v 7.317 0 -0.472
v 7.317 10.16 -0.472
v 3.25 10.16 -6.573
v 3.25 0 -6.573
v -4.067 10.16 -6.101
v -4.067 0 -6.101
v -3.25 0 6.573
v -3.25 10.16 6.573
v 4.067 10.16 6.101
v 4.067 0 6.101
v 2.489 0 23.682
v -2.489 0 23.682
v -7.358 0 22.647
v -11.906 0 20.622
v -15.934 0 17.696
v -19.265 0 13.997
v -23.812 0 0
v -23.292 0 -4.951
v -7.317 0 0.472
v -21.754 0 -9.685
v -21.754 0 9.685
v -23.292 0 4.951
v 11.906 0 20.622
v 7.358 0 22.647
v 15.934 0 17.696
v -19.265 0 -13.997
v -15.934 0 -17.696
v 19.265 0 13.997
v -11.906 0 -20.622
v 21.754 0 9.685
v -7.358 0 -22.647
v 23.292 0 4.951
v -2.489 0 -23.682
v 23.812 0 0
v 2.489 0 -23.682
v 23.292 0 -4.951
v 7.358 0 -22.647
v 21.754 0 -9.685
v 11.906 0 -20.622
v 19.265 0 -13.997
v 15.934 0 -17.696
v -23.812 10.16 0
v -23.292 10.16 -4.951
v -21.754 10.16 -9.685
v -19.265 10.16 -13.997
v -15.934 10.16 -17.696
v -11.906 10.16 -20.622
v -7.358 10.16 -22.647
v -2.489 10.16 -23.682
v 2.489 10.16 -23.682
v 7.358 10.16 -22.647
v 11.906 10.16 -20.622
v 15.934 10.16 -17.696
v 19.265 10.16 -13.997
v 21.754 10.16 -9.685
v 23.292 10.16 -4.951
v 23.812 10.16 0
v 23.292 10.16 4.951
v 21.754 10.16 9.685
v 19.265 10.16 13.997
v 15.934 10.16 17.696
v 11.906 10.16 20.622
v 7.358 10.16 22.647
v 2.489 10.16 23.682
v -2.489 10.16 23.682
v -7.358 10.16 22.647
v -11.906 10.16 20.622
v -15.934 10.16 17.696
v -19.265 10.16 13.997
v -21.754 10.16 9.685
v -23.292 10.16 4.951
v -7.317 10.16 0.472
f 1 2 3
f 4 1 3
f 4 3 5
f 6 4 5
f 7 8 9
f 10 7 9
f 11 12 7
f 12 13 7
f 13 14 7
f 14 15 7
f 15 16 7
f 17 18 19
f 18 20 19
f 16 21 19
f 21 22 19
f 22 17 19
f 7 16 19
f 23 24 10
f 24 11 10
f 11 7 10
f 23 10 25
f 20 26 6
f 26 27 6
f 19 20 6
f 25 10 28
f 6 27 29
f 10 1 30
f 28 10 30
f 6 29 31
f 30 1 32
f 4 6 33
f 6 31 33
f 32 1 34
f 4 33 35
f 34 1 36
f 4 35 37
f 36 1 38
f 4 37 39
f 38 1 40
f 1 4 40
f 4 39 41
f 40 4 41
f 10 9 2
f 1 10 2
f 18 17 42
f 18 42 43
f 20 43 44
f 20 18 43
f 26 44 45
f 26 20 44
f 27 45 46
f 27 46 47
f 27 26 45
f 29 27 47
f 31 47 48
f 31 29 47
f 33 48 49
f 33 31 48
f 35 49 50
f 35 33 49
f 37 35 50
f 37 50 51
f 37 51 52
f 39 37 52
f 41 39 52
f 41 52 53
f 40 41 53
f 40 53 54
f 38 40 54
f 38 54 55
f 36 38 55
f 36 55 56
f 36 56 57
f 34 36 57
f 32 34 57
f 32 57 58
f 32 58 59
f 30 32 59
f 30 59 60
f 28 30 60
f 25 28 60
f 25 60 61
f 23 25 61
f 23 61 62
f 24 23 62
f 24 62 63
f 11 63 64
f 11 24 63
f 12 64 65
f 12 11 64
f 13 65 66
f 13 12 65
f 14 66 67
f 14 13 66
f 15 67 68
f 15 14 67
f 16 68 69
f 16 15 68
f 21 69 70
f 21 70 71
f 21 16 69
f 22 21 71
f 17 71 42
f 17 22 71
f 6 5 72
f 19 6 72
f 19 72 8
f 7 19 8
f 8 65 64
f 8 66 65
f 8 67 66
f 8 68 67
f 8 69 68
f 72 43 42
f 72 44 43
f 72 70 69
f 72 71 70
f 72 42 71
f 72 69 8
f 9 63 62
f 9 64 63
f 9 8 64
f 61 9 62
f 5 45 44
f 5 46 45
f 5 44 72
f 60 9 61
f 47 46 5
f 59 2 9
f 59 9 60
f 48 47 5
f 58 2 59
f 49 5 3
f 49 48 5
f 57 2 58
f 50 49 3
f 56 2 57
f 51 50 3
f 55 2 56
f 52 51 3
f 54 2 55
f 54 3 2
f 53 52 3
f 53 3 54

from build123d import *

# Parameters (mm, degrees)
SKETCH1_R           = 30.1625
BOSS_EXTRUDE1_DEPTH = 10.16
CUT_EXTRUDE1_DEPTH  = 11.16
SKETCH3_R           = 30.1625
SKETCH3_R_2         = 23.8125
CUT_EXTRUDE2_DEPTH  = 11.16


with BuildPart() as part:
    # Sketch1 → Boss-Extrude1 (new body)
    with BuildSketch(Plane(origin=(0, 0, 0), x_dir=(1, 0, 0), z_dir=(0, 1, 0))):
        Circle(SKETCH1_R)
    extrude(amount=BOSS_EXTRUDE1_DEPTH)

    # Sketch2 → Cut-Extrude1 (cut, through all)
    with BuildSketch(Plane(origin=(0, 10.16, 0), x_dir=(1, 0, 0), z_dir=(0, 1, 0))):
        Polygon((4.067255107, -6.10088266), (7.317146922, 0.471904916), (3.249891816, 6.572787576), (-4.067255107, 6.10088266), (-7.317146922, -0.471904916), (-3.249891816, -6.572787576), align=None)
    extrude(amount=-CUT_EXTRUDE1_DEPTH, mode=Mode.SUBTRACT)

    # Sketch3 → Cut-Extrude2 (cut, through all)
    with BuildSketch(Plane(origin=(0, 0, 0), x_dir=(-1, 0, 0), z_dir=(0, -1, 0))):
        Circle(SKETCH3_R)
        Circle(SKETCH3_R_2, mode=Mode.SUBTRACT)
    extrude(amount=-CUT_EXTRUDE2_DEPTH, mode=Mode.SUBTRACT)


solid = part.part
